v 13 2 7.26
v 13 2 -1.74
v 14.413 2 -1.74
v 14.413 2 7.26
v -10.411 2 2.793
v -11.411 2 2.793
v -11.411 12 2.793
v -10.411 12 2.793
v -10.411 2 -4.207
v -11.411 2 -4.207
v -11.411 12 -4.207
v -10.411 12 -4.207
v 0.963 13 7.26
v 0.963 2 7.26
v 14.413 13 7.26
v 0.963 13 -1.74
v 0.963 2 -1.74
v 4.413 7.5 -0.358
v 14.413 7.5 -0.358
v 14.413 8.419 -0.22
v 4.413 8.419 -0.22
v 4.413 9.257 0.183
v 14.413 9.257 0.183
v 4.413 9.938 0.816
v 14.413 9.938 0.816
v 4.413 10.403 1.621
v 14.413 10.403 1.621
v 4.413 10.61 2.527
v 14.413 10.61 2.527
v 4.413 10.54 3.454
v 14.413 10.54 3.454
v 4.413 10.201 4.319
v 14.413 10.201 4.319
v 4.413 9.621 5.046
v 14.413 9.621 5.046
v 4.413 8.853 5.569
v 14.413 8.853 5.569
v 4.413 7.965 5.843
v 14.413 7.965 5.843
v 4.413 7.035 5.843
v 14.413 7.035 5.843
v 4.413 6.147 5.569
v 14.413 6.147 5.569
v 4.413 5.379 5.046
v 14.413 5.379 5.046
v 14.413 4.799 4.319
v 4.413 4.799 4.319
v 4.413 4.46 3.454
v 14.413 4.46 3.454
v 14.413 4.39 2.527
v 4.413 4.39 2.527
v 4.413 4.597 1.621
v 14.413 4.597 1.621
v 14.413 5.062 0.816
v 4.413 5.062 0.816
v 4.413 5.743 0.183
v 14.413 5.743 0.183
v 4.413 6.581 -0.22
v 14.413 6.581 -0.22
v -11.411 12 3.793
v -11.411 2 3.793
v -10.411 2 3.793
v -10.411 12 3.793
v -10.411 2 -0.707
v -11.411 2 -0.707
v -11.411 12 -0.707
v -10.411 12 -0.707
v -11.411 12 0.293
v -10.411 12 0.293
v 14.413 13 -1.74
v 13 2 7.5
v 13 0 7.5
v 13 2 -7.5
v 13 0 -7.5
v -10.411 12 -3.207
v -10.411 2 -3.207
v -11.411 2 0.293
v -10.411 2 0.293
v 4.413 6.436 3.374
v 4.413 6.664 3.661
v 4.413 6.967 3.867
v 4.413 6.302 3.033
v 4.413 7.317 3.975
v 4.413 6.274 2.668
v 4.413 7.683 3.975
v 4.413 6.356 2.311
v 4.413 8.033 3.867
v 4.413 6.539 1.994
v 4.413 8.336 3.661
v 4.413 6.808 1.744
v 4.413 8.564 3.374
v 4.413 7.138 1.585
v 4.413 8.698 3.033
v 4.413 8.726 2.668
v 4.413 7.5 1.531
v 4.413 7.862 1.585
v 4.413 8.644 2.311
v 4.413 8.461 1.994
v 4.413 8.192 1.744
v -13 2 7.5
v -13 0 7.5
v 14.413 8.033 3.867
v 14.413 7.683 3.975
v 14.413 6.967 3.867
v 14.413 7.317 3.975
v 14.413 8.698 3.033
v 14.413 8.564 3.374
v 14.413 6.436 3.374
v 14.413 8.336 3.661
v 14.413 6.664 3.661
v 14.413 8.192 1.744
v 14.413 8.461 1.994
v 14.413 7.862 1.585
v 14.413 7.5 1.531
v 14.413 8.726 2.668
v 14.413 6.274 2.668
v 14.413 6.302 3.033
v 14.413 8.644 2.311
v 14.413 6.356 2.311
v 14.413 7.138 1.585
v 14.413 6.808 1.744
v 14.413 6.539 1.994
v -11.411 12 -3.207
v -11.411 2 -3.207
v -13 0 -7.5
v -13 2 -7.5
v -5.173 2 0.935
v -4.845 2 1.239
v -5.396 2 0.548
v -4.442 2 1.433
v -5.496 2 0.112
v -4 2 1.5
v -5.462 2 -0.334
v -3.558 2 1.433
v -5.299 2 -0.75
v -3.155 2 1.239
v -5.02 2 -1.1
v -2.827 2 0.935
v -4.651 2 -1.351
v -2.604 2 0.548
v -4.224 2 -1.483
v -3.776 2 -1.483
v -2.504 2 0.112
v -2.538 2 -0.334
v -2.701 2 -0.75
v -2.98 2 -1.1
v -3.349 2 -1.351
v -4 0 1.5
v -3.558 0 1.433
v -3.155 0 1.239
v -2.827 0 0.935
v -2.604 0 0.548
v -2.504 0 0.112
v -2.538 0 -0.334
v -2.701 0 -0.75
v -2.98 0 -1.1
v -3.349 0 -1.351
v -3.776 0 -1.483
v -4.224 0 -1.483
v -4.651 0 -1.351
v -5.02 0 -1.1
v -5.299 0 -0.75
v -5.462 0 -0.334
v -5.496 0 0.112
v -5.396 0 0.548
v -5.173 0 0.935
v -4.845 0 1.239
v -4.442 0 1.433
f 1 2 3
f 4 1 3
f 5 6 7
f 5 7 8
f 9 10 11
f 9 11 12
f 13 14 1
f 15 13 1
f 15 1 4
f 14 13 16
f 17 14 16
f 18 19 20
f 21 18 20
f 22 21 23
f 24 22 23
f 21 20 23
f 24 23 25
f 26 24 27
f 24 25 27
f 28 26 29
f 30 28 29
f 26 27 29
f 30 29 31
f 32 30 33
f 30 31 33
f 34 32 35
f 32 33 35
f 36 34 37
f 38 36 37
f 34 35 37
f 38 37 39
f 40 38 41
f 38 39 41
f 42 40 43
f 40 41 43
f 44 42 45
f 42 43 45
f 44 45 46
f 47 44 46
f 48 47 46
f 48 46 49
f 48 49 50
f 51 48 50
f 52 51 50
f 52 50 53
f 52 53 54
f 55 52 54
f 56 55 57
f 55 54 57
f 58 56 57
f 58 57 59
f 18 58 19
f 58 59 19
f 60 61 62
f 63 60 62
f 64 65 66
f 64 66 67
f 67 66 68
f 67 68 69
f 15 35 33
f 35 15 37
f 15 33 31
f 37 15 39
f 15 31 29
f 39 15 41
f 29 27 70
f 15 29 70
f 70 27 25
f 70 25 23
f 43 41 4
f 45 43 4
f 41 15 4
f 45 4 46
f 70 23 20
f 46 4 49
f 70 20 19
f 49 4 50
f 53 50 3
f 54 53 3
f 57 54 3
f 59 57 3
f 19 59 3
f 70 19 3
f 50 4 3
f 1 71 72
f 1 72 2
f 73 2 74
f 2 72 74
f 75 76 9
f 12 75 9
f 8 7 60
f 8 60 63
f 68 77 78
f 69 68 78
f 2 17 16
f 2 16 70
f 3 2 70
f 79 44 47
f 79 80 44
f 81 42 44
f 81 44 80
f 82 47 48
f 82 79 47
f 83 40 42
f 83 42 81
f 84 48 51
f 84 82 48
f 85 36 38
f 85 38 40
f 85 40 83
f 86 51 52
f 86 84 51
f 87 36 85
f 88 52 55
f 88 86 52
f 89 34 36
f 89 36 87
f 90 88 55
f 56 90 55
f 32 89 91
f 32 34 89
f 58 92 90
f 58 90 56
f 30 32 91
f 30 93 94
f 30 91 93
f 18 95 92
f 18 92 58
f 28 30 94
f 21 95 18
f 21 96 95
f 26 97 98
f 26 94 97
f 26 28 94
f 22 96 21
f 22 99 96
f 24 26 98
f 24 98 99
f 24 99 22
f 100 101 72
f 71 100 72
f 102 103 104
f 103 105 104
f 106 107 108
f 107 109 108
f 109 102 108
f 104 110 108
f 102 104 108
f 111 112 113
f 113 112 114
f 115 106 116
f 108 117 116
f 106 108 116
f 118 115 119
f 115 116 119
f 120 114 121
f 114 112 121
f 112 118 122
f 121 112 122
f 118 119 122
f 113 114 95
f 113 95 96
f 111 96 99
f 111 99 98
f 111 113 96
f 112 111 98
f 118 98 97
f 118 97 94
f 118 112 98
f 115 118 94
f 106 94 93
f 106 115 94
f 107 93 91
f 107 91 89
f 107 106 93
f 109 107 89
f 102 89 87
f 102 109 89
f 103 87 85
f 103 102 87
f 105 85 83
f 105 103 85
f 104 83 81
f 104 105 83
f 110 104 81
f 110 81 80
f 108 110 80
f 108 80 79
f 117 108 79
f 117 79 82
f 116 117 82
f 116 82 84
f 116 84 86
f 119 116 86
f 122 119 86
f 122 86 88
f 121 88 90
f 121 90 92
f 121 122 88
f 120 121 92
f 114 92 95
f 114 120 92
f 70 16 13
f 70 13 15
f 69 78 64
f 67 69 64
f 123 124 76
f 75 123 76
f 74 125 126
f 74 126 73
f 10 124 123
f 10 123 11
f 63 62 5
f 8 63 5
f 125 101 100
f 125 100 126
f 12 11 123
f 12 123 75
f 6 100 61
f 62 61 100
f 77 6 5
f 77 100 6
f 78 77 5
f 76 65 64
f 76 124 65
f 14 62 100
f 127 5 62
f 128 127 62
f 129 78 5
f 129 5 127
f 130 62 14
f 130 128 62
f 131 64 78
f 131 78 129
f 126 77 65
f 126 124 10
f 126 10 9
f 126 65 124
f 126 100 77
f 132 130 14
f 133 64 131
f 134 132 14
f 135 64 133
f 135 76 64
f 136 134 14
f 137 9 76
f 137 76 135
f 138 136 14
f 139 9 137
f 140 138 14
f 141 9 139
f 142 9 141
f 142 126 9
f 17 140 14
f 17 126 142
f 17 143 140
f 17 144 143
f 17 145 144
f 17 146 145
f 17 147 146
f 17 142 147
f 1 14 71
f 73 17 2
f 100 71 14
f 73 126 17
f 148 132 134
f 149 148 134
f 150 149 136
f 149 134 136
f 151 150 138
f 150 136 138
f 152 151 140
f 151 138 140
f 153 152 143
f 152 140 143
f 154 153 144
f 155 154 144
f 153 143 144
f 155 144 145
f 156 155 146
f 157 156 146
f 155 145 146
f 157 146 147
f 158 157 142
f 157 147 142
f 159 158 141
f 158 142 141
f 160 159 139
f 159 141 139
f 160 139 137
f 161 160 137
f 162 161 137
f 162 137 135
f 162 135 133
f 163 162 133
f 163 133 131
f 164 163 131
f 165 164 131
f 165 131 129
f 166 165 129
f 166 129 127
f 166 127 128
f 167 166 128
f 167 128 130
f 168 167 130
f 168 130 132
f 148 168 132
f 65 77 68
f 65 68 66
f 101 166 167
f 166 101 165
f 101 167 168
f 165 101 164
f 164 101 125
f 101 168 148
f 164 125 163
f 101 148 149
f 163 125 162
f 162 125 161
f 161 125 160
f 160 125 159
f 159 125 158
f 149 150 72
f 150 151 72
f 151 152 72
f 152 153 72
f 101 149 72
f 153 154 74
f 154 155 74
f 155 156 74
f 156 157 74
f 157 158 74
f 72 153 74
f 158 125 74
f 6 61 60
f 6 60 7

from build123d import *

# Parameters (mm, degrees)
SKETCH1_W           = 26
SKETCH1_H           = 15
BOSS_EXTRUDE1_DEPTH = 2
SKETCH2_W           = 13.45020195
SKETCH2_H           = 9
BOSS_EXTRUDE2_DEPTH = 11
SKETCH3_R           = 1.5
CUT_EXTRUDE1_DEPTH  = 11
SKETCH4_W           = 1
SKETCH4_H           = 1
BOSS_EXTRUDE3_DEPTH = 10
SKETCH5_R           = 3.118355213
SKETCH5_R_2         = 1.2290481
CUT_EXTRUDE2_DEPTH  = 10


with BuildPart() as part:
    # Sketch1 → Boss-Extrude1 (new body)
    with BuildSketch(Plane(origin=(0, 0, 0), x_dir=(1, 0, 0), z_dir=(0, 1, 0))):
        Rectangle(SKETCH1_W, SKETCH1_H)
    extrude(amount=BOSS_EXTRUDE1_DEPTH)

    # Sketch2 → Boss-Extrude2 (add)
    with BuildSketch(Plane(origin=(0, 2, 0), x_dir=(1, 0, 0), z_dir=(0, 1, 0))):
        with Locations((7.687739683, -2.759900257)):
            Rectangle(SKETCH2_W, SKETCH2_H)
    extrude(amount=BOSS_EXTRUDE2_DEPTH)

    # Sketch3 → Cut-Extrude1 (cut)
    with BuildSketch(Plane(origin=(0, 2, 0), x_dir=(1, 0, 0), z_dir=(0, 1, 0))):
        with Locations(Location((-4, 0, 0), (0, 0, 270))):
            Circle(SKETCH3_R)
    extrude(amount=-CUT_EXTRUDE1_DEPTH, mode=Mode.SUBTRACT)

    # Sketch4 → Boss-Extrude3 (add)
    with BuildSketch(Plane(origin=(0, 2, 0), x_dir=(1, 0, 0), z_dir=(0, 1, 0))):
        with Locations((-10.910563353, -3.293392003)):
            Rectangle(SKETCH4_W, SKETCH4_H)
        with Locations((-10.910563353, 0.206607997)):
            Rectangle(SKETCH4_W, SKETCH4_H)
        with Locations((-10.910563353, 3.706607997)):
            Rectangle(SKETCH4_W, SKETCH4_H)
    extrude(amount=BOSS_EXTRUDE3_DEPTH)

    # Sketch5 → Cut-Extrude2 (cut)
    with BuildSketch(Plane(origin=(14.412840658, 0, 0), x_dir=(0, 0, -1), z_dir=(1, 0, 0))):
        with Locations((-2.759900257, 7.5)):
            Circle(SKETCH5_R)
        with Locations((-2.759900257, 7.5)):
            Circle(SKETCH5_R_2, mode=Mode.SUBTRACT)
    extrude(amount=-CUT_EXTRUDE2_DEPTH, mode=Mode.SUBTRACT)


solid = part.part
